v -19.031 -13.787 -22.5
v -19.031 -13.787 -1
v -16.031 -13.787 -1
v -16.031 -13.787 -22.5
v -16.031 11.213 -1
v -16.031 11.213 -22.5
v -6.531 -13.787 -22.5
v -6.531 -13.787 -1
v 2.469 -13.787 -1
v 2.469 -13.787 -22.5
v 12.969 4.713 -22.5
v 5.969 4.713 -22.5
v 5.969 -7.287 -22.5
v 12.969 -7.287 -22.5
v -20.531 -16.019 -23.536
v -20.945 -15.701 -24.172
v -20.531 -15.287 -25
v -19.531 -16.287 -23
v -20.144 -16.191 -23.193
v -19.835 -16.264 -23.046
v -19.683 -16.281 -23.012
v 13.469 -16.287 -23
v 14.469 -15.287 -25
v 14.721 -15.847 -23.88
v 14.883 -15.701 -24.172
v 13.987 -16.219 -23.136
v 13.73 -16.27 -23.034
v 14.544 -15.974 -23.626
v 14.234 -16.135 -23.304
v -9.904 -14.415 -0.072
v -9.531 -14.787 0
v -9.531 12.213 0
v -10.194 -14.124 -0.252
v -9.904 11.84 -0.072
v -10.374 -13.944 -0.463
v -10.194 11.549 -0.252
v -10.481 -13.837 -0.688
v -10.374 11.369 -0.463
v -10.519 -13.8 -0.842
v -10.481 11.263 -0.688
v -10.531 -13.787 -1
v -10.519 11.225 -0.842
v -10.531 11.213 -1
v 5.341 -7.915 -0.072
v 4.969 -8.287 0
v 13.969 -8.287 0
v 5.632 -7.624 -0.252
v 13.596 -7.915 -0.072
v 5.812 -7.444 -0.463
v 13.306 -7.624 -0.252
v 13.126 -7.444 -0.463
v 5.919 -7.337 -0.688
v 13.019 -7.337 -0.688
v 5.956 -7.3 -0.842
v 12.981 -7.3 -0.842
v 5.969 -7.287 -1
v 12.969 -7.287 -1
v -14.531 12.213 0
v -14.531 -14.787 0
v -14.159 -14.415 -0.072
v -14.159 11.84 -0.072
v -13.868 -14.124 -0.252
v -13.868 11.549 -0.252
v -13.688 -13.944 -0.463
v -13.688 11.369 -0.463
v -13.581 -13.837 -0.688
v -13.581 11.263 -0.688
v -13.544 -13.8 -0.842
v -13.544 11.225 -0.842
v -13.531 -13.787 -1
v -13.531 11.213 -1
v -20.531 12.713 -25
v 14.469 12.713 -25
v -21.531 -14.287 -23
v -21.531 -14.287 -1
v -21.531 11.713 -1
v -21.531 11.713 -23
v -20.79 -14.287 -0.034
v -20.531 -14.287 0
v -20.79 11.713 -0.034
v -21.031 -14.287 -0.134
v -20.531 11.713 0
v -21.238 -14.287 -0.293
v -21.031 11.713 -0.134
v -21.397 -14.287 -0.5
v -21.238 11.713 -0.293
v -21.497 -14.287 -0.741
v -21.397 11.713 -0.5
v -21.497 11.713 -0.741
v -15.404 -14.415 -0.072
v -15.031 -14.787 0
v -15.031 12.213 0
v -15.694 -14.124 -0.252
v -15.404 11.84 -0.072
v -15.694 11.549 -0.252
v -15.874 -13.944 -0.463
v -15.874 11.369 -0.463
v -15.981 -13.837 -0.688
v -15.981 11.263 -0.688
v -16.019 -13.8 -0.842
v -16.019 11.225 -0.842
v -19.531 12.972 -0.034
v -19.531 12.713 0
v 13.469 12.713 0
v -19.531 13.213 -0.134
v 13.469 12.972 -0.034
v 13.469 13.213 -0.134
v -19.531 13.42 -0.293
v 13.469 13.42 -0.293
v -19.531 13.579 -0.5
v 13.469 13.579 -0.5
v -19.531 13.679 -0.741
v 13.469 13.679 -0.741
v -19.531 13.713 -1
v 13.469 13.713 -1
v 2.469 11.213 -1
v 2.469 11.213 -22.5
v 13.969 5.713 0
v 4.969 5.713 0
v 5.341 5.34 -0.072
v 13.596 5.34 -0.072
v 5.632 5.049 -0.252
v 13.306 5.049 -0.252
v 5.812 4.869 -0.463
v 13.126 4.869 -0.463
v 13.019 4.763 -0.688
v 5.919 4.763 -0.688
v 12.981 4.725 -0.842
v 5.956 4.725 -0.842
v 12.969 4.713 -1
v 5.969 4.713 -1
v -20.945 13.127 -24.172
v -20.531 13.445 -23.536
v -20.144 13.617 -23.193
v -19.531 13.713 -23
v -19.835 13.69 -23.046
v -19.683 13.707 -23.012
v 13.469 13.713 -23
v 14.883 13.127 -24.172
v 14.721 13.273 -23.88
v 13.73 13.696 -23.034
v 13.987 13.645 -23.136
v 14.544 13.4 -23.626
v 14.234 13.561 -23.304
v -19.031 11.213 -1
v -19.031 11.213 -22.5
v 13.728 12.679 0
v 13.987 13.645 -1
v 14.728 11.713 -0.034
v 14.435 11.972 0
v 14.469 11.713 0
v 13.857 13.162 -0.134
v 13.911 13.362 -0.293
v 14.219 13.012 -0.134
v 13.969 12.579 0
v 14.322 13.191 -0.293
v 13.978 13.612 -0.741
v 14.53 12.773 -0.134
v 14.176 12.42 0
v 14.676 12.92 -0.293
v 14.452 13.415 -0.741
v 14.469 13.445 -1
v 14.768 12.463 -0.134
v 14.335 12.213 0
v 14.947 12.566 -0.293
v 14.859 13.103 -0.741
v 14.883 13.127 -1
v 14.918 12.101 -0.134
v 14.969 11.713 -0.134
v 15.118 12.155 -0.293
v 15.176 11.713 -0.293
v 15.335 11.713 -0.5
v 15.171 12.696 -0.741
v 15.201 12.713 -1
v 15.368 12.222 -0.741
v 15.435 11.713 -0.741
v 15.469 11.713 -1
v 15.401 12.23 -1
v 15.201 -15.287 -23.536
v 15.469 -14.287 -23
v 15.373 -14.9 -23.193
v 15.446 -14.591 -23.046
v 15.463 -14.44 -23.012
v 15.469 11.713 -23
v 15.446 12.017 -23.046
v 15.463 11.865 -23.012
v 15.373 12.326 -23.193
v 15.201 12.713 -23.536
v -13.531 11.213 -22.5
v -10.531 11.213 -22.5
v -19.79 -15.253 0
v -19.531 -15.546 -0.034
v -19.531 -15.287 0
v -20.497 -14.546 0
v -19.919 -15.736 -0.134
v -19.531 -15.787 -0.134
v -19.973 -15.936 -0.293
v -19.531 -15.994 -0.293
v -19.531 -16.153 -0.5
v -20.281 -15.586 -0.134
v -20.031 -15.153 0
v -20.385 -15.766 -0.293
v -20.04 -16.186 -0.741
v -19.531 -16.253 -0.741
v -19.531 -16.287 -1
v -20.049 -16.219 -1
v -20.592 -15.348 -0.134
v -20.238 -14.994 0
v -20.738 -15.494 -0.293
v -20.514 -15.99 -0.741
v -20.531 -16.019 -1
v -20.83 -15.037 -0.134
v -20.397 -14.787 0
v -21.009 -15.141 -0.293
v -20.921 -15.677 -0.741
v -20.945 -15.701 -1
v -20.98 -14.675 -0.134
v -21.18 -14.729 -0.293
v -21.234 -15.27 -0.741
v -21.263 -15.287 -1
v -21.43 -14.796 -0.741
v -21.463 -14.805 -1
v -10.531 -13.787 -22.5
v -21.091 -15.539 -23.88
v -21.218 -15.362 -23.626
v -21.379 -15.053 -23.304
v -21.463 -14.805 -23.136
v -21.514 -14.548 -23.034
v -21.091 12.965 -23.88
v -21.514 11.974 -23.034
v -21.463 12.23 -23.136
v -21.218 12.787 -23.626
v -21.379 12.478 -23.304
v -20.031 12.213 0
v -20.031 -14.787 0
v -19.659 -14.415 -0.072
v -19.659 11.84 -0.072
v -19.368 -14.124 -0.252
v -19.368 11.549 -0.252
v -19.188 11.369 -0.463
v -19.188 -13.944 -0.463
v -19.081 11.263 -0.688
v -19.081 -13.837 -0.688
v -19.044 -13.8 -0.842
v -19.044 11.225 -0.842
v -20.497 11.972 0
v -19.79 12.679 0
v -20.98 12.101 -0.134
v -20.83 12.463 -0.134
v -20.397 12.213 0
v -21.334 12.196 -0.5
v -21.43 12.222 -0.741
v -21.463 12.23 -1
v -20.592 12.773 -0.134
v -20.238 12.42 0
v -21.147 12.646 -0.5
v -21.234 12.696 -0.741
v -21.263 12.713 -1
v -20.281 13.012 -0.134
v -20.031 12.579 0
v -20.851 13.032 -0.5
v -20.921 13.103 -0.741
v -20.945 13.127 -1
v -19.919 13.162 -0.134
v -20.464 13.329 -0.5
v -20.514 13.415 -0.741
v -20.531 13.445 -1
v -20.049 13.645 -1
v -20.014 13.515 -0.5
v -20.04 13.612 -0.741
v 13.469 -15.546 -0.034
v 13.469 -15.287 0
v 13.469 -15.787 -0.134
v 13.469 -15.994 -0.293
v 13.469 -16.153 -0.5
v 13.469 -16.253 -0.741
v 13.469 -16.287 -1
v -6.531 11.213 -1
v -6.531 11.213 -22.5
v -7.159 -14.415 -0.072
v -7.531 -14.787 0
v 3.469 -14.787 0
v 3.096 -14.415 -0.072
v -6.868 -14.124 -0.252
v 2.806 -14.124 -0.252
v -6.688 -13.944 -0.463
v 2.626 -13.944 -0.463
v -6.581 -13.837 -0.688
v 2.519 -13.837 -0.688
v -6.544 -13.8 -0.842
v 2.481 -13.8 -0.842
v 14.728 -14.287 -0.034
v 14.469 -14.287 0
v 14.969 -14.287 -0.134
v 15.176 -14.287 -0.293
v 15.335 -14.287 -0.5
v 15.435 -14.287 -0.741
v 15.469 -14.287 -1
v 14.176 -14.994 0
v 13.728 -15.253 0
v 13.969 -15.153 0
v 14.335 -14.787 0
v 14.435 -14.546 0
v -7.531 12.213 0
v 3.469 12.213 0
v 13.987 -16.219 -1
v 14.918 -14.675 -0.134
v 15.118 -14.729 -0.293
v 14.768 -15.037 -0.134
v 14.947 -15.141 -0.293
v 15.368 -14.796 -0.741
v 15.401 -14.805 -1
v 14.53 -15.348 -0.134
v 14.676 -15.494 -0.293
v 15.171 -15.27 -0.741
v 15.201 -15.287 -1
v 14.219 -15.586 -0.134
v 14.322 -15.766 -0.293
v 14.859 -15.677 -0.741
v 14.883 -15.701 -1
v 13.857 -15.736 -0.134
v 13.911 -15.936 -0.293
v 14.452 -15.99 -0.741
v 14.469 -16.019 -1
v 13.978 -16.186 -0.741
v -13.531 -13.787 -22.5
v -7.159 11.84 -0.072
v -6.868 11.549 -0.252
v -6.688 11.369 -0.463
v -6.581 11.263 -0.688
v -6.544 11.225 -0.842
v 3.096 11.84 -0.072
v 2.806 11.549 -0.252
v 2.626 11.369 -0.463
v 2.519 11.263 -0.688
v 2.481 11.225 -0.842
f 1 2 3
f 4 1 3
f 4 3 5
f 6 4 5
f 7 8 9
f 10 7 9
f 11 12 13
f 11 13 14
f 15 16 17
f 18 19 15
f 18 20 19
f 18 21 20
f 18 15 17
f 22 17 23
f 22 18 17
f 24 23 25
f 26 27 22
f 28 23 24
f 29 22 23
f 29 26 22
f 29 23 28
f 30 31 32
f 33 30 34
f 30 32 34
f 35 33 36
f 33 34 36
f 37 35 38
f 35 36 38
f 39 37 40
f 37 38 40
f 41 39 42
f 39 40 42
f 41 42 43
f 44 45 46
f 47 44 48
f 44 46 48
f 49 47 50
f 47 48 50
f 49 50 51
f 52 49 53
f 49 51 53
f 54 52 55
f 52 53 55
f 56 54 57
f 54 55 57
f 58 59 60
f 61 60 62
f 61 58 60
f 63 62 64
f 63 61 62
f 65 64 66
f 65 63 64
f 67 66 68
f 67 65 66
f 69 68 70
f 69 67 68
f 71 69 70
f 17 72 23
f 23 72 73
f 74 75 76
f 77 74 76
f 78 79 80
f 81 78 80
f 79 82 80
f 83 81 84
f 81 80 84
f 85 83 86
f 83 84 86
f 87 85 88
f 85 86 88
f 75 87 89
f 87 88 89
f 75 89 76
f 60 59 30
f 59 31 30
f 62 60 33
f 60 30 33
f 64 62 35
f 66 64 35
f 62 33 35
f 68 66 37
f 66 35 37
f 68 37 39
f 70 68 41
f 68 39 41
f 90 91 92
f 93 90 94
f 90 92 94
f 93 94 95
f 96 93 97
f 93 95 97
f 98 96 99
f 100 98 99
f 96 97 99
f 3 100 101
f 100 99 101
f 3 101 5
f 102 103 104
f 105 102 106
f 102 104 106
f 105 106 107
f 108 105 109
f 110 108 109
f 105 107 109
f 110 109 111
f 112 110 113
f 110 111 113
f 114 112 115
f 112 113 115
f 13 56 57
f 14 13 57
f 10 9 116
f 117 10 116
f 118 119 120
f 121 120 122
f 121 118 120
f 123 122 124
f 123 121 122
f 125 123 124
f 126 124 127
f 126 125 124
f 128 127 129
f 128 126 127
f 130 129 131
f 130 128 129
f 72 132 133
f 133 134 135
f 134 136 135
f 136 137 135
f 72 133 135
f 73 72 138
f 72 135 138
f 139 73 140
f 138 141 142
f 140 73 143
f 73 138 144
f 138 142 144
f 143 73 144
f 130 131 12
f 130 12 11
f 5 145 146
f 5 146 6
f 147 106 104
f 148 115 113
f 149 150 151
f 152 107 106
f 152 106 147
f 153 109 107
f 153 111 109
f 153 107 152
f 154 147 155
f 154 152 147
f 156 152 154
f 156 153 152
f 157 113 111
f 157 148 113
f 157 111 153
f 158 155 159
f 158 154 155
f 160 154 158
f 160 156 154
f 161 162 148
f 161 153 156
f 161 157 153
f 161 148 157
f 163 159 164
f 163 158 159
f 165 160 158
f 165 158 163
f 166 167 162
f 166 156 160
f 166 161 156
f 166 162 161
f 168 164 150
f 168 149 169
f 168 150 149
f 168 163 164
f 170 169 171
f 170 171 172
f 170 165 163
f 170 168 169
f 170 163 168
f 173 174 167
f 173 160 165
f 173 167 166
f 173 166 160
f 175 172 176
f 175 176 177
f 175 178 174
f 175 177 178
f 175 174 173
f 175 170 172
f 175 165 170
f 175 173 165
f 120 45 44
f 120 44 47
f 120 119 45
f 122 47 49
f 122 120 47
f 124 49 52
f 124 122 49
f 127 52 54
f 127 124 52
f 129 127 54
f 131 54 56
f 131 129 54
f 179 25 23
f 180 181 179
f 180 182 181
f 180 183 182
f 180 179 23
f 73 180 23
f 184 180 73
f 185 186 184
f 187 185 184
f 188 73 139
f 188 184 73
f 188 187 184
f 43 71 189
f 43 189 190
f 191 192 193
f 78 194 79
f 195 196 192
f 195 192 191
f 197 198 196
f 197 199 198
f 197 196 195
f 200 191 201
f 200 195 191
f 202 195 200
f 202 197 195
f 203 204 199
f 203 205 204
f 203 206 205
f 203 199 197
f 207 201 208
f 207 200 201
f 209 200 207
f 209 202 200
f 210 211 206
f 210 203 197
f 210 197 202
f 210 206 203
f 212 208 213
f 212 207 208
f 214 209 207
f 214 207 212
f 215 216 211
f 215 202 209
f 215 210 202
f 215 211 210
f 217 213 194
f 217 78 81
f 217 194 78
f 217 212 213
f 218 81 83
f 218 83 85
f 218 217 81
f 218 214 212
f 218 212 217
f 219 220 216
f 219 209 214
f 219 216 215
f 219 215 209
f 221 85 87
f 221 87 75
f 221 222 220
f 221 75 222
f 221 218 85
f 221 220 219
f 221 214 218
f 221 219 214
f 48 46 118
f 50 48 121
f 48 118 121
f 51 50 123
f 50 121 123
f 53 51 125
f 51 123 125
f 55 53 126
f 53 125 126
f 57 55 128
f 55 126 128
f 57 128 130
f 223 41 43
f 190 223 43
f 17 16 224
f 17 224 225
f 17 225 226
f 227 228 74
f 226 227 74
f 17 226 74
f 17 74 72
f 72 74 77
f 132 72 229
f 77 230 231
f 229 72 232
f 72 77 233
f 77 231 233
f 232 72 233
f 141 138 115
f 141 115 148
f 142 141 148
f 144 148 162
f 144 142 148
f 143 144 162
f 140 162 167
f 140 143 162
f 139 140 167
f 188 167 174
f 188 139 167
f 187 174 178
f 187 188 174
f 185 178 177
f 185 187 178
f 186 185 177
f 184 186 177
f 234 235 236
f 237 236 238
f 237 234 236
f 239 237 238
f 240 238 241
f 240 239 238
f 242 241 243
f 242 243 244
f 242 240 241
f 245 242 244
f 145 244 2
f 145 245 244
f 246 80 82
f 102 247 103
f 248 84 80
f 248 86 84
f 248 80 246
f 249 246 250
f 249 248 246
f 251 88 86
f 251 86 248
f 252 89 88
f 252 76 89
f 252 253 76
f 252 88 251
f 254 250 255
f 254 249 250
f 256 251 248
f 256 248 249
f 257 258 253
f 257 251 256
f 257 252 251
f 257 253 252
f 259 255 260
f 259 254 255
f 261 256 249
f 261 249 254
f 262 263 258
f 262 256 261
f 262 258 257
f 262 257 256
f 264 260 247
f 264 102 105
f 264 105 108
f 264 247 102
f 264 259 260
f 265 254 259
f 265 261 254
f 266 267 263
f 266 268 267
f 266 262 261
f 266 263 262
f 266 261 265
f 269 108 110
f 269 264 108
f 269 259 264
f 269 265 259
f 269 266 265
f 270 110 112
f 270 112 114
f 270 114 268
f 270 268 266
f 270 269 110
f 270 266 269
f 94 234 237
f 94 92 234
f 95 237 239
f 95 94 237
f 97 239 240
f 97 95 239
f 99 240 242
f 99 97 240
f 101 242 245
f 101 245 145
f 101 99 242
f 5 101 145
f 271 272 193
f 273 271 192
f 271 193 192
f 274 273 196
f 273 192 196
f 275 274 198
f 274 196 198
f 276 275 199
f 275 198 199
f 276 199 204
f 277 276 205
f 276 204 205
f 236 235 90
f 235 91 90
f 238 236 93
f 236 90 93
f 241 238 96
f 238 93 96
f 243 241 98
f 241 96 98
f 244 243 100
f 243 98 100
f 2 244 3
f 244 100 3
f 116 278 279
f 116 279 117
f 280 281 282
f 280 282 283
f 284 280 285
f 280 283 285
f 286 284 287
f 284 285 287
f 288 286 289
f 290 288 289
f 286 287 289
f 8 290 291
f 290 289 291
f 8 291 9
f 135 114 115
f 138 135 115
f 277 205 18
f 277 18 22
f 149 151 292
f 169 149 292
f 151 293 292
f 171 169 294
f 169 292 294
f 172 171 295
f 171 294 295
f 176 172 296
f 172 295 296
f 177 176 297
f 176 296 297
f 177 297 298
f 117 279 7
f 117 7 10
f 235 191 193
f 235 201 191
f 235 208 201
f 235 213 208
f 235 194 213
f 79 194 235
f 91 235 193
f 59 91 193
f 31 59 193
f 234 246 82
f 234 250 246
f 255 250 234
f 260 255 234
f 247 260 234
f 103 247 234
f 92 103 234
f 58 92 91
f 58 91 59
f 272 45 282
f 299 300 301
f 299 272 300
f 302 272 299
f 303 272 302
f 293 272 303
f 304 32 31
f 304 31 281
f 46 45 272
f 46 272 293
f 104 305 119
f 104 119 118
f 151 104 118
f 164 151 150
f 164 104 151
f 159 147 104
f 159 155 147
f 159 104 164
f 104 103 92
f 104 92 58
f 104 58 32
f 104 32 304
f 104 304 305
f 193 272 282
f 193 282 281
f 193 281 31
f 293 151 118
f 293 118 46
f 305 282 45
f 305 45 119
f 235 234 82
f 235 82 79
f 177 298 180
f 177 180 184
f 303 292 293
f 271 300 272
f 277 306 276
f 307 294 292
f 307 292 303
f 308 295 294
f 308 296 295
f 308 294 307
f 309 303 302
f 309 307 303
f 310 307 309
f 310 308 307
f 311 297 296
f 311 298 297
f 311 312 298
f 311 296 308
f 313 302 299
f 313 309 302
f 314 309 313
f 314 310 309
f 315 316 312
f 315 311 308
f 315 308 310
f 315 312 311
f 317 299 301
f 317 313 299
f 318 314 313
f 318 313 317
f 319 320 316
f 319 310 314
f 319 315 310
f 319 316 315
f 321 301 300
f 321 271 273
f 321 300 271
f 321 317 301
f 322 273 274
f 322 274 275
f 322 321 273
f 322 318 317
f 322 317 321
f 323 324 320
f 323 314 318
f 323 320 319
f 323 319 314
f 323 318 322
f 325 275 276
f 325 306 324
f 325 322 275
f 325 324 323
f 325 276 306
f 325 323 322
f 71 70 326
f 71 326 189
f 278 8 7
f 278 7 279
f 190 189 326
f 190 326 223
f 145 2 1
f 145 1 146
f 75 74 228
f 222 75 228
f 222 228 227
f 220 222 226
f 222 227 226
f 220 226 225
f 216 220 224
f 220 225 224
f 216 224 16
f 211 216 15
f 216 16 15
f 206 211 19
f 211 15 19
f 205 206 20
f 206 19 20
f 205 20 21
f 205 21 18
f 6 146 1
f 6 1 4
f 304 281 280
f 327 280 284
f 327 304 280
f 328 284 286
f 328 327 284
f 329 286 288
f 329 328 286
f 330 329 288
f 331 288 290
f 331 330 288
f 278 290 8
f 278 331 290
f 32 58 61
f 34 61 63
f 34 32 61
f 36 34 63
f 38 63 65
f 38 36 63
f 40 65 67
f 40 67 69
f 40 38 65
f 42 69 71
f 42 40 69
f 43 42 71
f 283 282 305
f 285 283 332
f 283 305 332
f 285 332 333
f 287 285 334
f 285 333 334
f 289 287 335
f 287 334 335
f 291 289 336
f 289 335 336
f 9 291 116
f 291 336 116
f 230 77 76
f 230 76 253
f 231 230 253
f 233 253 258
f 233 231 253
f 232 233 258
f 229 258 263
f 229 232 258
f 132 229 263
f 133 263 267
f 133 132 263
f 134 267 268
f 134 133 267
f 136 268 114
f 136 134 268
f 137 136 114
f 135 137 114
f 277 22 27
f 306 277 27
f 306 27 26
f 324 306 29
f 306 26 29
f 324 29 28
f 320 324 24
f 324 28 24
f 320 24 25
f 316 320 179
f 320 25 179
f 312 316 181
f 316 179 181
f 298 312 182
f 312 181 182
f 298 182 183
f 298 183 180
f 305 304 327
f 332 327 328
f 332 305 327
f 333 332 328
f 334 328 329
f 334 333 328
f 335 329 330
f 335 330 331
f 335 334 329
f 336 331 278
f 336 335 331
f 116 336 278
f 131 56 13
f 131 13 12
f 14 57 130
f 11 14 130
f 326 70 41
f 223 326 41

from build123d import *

# Parameters (mm, degrees)
F0_W     = 37
F0_H     = 30
F0_W_2   = 3
F0_H_2   = 25
F0_W_3   = 9
F0_W_4   = 7
F0_H_3   = 12
F1_DEPTH = 25
F2_DEPTH = 22.5
F3_SIZE2 = 2
F3_SIZE  = 1
F4_R     = 2
F5_R     = 1


with BuildPart() as f1:
    # F0 (on Top) → F1 (new body)
    with BuildSketch(Plane.XY):
        with Locations((-3.031099186, -1.2872133628)):
            Rectangle(F0_W, F0_H)
        with Locations((-17.531099186, -1.2872133628)):
            Rectangle(F0_W_2, F0_H_2, mode=Mode.SUBTRACT)
        with Locations((-12.031099186, -1.2872133628)):
            Rectangle(F0_W_2, F0_H_2, mode=Mode.SUBTRACT)
        with Locations((-2.031099186, -1.2872133628)):
            Rectangle(F0_W_3, F0_H_2, mode=Mode.SUBTRACT)
        with Locations((9.468900814, -1.2872133628)):
            Rectangle(F0_W_4, F0_H_3, mode=Mode.SUBTRACT)
        with Locations((-17.531099186, -1.2872133628)):
            Rectangle(F0_W_2, F0_H_2)
        with Locations((-12.031099186, -1.2872133628)):
            Rectangle(F0_W_2, F0_H_2)
        with Locations((-2.031099186, -1.2872133628)):
            Rectangle(F0_W_3, F0_H_2)
        with Locations((9.468900814, -1.2872133628)):
            Rectangle(F0_W_4, F0_H_3)
    extrude(amount=-F1_DEPTH)

    # F0 (on Top) → F2 (cut)
    with BuildSketch(Plane.XY):
        with Locations((-17.531099186, -1.2872133628)):
            Rectangle(F0_W_2, F0_H_2)
        with Locations((-12.031099186, -1.2872133628)):
            Rectangle(F0_W_2, F0_H_2)
        with Locations((-2.031099186, -1.2872133628)):
            Rectangle(F0_W_3, F0_H_2)
        with Locations((9.468900814, -1.2872133628)):
            Rectangle(F0_W_4, F0_H_3)
    extrude(amount=-F2_DEPTH, mode=Mode.SUBTRACT)

    # F3
    f3_edges = [f1.edges().sort_by_distance(p)[0] for p in [
        (-3.031099, -16.287213, -25),
        (15.468901, -1.287213, -25),
        (-3.031099, 13.712787, -25),
        (-21.531099, -1.287213, -25),
    ]]
    f3_side = f1.faces().sort_by_distance((-3.031099, -1.287213, -25))[0]
    chamfer(f3_edges, length=F3_SIZE, length2=F3_SIZE2, reference=f3_side)

    # F4
    f4_edges = [f1.edges().sort_by_distance(p)[0] for p in [
        (-21.531099, -16.287213, -11.5),
        (-21.531099, 13.712787, -11.5),
        (15.468901, 13.712787, -11.5),
        (15.468901, -16.287213, -11.5),
    ]]
    fillet(f4_edges, radius=F4_R)

    # F5
    f5_edges = [f1.edges().sort_by_distance(p)[0] for p in [
        (12.968901, -1.287213, 0),
        (9.468901, -7.287213, 0),
        (5.968901, -1.287213, 0),
        (9.468901, 4.712787, 0),
        (2.468901, -1.287213, 0),
        (-2.031099, -13.787213, 0),
        (-6.531099, -1.287213, 0),
        (-2.031099, 11.212787, 0),
        (-10.531099, -1.287213, 0),
        (-12.031099, -13.787213, 0),
        (-13.531099, -1.287213, 0),
        (-12.031099, 11.212787, 0),
        (-16.031099, -1.287213, 0),
        (-17.531099, 11.212787, 0),
        (-19.031099, -1.287213, 0),
        (-17.531099, -13.787213, 0),
        (-3.031099, 13.712787, 0),
    ]]
    fillet(f5_edges, radius=F5_R)


solid = f1.part
